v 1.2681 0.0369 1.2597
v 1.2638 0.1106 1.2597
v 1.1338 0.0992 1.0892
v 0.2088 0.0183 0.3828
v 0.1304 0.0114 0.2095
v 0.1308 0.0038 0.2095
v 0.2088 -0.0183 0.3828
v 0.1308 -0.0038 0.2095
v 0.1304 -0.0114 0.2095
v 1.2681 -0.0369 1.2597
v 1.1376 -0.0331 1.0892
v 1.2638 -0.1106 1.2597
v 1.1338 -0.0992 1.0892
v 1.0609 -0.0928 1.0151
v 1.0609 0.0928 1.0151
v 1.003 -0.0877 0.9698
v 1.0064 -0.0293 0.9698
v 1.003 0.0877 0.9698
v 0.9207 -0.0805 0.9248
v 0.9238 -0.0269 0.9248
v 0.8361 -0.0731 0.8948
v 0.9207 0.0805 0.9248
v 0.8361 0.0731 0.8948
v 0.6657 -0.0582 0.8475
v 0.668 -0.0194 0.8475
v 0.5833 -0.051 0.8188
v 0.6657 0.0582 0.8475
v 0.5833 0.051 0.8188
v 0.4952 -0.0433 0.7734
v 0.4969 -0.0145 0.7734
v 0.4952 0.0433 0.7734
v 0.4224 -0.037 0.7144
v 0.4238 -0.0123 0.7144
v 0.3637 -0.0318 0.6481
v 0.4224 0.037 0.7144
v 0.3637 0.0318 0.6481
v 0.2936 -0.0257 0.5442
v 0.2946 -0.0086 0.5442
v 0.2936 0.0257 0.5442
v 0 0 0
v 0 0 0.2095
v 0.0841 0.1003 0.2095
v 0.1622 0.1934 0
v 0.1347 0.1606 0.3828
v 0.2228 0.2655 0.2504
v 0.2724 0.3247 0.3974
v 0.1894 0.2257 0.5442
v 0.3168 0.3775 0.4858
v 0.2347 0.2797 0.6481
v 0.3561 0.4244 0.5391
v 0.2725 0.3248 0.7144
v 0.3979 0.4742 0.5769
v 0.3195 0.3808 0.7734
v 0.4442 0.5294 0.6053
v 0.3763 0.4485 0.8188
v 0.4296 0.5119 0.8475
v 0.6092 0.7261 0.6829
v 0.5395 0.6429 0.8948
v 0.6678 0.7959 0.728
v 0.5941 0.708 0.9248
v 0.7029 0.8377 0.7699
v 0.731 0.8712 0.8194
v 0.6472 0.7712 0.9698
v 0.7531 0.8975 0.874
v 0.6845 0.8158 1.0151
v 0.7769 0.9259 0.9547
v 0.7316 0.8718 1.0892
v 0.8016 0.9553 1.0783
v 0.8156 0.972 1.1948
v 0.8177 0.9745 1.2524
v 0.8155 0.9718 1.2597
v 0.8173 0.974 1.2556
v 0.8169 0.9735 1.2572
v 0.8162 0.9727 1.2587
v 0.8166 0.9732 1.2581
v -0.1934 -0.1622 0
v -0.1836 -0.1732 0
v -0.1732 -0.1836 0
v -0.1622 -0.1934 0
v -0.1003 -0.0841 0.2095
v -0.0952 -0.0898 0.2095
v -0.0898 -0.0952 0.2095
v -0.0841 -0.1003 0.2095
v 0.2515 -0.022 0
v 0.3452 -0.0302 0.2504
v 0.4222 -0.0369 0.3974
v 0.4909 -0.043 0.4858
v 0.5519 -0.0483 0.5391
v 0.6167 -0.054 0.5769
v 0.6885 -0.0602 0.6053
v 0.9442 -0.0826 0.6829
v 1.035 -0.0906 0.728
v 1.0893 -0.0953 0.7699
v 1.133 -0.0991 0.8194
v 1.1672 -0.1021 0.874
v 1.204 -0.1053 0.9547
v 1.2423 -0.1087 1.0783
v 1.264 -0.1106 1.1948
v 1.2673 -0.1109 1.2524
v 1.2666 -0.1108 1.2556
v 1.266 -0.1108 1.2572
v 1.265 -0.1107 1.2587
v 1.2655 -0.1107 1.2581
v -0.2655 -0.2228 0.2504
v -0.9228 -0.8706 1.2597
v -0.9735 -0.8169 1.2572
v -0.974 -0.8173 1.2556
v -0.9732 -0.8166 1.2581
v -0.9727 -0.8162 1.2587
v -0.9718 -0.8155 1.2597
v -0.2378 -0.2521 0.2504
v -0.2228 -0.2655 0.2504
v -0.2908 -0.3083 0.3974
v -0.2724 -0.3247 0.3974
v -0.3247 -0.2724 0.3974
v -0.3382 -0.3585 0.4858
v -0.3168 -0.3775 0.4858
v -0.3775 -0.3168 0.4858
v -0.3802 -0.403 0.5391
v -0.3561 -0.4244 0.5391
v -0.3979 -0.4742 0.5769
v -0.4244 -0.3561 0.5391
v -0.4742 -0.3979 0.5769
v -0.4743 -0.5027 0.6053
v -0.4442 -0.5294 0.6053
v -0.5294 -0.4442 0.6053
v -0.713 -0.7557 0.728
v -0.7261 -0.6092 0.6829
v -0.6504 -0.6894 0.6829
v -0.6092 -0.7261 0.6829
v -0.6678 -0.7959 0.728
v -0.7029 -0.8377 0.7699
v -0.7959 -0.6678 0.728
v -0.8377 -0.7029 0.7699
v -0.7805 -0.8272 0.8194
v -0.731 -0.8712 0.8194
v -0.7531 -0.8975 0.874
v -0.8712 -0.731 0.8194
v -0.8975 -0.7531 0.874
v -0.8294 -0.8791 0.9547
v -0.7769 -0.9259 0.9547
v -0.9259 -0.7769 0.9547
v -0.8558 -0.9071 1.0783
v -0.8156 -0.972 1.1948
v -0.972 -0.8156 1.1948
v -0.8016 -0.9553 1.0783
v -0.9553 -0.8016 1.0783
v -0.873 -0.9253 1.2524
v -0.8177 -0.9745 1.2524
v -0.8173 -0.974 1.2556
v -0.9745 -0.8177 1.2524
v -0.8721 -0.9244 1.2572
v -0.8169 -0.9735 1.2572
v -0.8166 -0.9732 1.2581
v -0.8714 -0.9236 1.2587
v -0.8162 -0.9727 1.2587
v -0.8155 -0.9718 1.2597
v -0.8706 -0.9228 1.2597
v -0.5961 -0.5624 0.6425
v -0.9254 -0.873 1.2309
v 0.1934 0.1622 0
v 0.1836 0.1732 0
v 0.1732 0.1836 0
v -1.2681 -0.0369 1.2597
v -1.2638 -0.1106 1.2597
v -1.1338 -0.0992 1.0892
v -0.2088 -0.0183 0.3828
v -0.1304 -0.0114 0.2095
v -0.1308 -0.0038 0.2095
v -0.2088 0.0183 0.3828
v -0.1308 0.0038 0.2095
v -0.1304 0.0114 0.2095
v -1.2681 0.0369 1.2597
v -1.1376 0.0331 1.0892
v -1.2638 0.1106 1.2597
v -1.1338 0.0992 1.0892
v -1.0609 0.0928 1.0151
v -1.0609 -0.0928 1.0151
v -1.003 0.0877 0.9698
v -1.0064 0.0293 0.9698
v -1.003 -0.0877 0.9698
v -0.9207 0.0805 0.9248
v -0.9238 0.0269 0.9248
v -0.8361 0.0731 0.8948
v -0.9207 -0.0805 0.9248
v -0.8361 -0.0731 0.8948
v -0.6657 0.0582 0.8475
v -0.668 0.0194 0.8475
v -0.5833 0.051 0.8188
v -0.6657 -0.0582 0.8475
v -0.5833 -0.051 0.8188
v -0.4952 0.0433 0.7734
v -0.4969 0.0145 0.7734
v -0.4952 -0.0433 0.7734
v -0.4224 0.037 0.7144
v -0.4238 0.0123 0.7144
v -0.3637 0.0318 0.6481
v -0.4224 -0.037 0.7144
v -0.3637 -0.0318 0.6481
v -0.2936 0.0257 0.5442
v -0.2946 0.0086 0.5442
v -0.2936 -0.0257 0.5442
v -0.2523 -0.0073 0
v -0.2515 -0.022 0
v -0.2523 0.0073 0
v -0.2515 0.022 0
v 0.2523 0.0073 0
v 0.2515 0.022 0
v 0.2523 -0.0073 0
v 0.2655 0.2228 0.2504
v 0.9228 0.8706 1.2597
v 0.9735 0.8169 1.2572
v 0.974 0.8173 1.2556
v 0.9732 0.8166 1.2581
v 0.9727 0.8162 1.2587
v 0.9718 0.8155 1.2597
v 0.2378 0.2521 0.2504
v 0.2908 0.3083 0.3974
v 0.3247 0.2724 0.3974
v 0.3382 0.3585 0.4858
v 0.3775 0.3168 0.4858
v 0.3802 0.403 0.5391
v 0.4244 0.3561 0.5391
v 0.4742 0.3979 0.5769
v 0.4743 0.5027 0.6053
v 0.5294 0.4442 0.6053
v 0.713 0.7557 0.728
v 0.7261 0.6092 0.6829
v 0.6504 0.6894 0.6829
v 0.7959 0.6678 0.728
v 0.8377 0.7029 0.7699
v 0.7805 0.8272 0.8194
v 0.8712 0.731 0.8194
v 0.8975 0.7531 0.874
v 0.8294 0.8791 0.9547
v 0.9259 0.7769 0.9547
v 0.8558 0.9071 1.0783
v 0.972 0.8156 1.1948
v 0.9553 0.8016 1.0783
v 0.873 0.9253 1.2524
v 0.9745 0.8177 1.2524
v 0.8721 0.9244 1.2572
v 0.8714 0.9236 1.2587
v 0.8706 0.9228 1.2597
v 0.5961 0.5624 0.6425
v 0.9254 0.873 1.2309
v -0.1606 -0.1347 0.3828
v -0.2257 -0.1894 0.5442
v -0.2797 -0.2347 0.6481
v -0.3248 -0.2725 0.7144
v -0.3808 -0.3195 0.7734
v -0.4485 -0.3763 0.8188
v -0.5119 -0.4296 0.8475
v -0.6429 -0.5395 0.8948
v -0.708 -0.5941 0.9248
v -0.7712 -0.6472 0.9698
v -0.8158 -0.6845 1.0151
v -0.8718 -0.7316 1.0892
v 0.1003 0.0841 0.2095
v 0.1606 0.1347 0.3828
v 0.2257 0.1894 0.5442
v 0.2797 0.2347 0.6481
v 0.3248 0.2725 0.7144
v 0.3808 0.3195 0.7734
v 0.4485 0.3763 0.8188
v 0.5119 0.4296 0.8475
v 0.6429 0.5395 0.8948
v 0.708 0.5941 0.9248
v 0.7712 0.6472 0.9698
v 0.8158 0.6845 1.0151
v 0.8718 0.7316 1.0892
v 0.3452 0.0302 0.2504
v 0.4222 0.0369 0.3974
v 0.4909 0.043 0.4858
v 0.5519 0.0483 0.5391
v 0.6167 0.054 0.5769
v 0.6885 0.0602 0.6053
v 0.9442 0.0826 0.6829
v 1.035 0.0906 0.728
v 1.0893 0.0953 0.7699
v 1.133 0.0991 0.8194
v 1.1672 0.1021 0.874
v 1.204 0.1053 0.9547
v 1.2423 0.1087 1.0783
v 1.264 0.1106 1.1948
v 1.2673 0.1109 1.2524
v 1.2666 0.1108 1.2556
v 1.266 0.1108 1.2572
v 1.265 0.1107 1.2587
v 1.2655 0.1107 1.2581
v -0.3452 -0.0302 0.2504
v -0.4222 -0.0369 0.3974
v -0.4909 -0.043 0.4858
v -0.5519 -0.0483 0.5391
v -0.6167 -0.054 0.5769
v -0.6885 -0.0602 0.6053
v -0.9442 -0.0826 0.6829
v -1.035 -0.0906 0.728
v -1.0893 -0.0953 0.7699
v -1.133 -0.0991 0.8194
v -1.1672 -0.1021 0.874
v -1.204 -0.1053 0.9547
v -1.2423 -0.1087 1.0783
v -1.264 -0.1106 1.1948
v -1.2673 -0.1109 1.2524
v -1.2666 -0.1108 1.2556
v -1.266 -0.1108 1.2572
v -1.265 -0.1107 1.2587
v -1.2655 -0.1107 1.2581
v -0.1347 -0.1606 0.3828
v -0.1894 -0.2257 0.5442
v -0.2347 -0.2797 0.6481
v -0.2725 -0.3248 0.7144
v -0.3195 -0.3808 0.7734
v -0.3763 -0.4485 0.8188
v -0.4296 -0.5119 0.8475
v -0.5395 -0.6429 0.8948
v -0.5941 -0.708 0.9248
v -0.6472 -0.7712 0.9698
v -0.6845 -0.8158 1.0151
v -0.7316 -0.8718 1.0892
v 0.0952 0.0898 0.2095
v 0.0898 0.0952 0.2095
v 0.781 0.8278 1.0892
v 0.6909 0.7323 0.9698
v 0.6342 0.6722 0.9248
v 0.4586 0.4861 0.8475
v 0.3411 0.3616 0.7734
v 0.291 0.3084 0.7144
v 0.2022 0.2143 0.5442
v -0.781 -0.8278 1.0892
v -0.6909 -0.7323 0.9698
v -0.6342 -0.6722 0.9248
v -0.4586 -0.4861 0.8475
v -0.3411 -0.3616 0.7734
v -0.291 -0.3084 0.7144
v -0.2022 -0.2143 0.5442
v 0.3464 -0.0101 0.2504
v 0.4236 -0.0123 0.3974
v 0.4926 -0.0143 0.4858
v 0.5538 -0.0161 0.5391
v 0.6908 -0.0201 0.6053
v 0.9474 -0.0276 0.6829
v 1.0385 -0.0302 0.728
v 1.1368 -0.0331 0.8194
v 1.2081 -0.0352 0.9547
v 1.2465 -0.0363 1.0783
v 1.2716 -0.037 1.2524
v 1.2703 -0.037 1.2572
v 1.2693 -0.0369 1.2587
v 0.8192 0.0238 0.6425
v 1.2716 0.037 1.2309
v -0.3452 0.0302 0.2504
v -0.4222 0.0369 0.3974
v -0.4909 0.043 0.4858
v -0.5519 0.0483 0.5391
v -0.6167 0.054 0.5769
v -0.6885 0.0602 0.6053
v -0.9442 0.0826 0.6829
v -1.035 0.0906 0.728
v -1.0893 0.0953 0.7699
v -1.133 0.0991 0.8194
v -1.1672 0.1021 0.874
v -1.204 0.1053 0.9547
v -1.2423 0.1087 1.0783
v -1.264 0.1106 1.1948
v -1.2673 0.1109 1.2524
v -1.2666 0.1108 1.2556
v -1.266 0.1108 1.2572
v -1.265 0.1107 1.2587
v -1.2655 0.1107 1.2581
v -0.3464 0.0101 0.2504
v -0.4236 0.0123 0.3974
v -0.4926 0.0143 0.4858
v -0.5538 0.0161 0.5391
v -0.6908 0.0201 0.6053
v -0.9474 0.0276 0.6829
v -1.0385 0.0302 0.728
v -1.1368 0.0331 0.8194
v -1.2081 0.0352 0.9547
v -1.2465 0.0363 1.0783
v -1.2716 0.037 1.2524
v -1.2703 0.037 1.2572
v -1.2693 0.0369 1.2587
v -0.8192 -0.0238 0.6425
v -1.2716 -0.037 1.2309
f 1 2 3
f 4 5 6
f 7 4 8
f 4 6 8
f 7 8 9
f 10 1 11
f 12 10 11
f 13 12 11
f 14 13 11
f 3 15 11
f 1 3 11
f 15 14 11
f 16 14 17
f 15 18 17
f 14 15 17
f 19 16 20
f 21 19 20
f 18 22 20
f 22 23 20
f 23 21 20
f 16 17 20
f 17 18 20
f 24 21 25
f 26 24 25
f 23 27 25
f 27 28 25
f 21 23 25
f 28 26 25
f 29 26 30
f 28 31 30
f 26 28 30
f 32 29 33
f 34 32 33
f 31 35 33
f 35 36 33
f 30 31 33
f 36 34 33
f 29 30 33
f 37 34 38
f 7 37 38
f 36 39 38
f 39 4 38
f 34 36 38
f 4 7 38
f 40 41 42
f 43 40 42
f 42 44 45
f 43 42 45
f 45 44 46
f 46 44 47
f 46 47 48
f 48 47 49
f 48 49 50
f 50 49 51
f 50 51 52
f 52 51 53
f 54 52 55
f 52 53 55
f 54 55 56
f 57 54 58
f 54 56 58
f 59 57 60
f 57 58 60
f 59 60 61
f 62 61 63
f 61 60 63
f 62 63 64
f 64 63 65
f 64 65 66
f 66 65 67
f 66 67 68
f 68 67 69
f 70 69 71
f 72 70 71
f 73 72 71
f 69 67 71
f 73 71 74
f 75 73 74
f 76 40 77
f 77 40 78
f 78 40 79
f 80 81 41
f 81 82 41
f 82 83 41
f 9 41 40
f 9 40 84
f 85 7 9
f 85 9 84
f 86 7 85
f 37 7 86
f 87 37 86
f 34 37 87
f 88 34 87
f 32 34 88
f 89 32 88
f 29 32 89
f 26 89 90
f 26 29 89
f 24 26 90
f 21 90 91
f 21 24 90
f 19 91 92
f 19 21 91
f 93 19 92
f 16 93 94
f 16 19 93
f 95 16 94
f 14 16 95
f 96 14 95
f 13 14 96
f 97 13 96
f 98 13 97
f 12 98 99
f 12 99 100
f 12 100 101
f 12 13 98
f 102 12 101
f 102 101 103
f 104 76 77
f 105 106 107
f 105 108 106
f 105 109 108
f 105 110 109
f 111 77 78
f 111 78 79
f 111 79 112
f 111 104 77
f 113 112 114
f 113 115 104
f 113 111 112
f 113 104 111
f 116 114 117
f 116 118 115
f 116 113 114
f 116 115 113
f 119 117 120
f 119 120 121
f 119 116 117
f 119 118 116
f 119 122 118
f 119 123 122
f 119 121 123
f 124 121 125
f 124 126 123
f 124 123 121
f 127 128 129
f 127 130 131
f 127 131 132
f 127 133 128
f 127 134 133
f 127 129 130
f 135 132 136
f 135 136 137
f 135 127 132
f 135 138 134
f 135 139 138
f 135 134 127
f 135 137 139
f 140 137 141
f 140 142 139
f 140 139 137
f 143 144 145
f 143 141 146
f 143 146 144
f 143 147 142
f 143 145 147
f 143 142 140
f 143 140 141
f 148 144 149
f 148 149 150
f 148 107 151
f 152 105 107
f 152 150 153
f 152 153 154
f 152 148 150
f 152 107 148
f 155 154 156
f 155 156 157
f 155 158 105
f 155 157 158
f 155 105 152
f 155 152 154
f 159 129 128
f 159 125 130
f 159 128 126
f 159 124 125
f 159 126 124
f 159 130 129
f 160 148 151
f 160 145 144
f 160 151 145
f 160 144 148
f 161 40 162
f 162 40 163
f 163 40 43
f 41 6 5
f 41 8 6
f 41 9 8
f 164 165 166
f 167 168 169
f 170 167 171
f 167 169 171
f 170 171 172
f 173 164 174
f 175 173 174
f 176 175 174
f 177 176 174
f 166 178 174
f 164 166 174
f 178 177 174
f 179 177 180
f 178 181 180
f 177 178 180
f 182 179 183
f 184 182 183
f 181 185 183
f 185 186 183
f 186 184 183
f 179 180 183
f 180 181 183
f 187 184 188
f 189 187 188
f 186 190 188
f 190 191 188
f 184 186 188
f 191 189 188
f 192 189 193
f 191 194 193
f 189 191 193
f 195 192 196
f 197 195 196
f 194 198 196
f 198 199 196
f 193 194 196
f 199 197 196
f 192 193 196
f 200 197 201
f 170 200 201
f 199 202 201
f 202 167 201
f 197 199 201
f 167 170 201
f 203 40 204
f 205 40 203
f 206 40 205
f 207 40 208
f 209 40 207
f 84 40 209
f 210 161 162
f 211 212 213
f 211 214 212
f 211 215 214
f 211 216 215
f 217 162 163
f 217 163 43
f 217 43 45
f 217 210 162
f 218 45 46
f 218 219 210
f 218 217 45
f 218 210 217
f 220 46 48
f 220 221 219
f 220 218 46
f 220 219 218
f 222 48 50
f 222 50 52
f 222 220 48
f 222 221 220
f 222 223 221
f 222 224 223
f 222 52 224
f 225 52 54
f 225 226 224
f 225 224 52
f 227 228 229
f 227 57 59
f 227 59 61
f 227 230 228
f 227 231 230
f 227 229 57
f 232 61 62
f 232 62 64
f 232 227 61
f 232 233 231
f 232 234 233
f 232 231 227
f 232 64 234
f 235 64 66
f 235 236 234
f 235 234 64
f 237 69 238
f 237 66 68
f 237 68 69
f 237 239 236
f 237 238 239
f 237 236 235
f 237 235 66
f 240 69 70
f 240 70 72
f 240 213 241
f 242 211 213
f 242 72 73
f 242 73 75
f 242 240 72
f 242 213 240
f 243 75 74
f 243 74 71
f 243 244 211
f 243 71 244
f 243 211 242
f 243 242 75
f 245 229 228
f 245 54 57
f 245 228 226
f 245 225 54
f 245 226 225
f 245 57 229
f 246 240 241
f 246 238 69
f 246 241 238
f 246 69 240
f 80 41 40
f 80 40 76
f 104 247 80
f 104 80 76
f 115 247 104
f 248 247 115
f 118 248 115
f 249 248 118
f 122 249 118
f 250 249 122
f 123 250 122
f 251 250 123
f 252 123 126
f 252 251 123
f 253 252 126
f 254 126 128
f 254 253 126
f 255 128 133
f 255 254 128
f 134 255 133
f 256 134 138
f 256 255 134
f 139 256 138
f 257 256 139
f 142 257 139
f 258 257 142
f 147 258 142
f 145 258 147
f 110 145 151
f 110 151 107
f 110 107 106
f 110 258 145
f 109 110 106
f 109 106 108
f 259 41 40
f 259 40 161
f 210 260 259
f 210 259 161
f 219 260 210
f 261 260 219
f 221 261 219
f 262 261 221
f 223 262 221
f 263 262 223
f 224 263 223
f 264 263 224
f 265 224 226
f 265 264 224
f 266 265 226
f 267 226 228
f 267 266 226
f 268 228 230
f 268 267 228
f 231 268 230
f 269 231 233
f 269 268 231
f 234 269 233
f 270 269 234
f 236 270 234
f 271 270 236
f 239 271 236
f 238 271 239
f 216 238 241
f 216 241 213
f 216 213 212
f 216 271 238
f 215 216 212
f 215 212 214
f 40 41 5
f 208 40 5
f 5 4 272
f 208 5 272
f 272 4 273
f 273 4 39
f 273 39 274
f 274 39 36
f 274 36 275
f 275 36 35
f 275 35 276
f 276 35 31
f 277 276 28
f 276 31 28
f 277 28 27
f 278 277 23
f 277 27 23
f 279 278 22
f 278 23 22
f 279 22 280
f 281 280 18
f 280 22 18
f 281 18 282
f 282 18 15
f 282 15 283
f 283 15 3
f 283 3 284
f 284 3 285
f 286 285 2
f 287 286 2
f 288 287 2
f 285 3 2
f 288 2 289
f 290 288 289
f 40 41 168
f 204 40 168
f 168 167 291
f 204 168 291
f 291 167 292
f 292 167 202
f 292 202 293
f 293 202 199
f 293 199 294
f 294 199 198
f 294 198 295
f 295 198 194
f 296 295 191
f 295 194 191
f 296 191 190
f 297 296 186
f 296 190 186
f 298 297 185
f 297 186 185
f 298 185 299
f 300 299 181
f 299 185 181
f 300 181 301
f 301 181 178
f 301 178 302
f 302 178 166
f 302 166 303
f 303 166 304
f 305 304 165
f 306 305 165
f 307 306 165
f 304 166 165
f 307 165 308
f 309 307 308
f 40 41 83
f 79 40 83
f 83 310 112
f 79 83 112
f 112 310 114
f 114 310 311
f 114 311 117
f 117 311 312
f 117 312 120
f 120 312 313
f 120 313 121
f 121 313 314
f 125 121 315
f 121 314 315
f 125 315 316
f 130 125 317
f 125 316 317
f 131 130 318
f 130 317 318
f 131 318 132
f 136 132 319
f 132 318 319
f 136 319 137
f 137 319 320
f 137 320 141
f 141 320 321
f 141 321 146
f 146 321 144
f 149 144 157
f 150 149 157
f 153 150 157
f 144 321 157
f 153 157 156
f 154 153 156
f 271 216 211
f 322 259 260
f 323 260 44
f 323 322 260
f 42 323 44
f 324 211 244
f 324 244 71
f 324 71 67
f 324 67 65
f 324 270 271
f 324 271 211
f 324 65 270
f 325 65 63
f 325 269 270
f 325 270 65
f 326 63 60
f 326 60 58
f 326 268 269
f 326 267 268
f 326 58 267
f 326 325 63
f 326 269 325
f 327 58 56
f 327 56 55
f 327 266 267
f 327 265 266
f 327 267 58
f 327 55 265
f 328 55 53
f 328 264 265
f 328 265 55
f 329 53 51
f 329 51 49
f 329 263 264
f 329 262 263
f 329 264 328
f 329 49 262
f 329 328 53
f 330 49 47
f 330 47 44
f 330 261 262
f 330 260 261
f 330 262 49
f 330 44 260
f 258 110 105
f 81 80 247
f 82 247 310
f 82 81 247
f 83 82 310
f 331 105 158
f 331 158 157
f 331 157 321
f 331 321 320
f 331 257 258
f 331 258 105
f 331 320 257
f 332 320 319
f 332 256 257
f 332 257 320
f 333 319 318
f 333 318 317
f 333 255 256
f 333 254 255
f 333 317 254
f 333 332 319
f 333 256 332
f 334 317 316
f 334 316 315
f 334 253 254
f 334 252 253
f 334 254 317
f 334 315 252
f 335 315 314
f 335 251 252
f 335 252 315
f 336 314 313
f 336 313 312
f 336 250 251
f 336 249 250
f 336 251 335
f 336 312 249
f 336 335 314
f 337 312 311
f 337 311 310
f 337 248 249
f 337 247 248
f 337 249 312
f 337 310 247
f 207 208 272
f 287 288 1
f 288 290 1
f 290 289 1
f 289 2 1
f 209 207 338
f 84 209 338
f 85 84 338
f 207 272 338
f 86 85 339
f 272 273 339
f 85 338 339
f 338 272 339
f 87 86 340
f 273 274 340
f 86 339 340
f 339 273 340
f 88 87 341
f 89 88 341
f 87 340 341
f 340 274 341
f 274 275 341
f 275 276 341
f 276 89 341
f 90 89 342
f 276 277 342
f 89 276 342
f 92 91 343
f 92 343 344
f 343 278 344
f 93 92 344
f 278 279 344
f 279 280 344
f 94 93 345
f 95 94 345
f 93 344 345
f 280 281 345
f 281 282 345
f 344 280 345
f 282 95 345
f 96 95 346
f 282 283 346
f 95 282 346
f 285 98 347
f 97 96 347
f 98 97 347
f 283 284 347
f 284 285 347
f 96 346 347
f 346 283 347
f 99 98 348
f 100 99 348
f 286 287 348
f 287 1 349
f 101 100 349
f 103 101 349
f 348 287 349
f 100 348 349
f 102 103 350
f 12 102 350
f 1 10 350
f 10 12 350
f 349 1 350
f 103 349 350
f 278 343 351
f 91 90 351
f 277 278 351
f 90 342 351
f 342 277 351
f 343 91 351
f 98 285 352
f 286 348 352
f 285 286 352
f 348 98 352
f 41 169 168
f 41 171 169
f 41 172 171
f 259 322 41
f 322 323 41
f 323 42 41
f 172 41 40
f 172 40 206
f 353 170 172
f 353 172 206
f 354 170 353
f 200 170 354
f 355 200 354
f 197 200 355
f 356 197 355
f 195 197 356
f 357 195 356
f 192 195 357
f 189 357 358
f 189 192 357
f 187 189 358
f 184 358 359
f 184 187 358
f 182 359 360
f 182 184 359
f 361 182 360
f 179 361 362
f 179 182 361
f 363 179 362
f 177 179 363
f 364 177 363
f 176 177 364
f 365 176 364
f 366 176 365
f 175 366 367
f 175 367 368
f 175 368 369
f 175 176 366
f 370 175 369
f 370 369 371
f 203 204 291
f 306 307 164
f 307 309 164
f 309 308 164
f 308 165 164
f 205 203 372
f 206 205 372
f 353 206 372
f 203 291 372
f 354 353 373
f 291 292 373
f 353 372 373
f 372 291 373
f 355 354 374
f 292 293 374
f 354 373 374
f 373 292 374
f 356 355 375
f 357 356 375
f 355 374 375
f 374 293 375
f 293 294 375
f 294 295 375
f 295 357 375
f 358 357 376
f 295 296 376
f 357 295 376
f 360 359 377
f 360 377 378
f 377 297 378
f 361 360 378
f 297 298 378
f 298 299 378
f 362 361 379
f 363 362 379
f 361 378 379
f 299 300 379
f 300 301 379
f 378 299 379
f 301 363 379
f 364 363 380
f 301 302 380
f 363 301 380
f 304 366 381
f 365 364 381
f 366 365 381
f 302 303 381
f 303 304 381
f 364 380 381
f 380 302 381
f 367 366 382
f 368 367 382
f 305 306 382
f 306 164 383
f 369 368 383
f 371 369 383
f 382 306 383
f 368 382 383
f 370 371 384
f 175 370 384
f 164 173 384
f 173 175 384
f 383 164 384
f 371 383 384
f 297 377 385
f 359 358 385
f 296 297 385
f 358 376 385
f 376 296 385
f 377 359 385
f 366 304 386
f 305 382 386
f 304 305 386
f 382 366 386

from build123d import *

# Parameters (mm, degrees)
F1_ANGLE_BACK = 5
F1_ANGLE      = 10
F3_COUNT      = 2


# Not quite as in the source:
# - a feature of the source that left no trace in its solid (it failed there, or was rolled back) is left out
# - a pattern or mirror of a feature is missing from the dataset's text; its kind, count and spacing are read off the source's solid


with BuildPart() as f1:
    # F0 (on Front) → F1 (revolve)
    with BuildSketch(Plane.XZ, mode=Mode.PRIVATE) as f1_sk:
        with BuildLine():
            add(Edge.make_bspline(
                [(-0.2524105464, 0), (-0.3307396385, 0.2256188139), (-0.4842284802, 0.6677274801), (-1.1998001381, 0.6252029855), (-1.2821282206, 1.2497196877), (-1.27, 1.2586820995), (-1.2686543401, 1.2596765041)],
                knots=[0, 0, 0, 0, 0.3404855991, 0.6671945103, 0.9630743035, 1, 1, 1, 1], degree=3))
            Line((-0.2524105464, 0), (0, 0))
            Line((0, 0), (0, 0.2095003059))
            Line((0, 0.2095003059), (-0.1308880734, 0.2095003059))
            add(Edge.make_bspline(
                [(-1.2686543401, 1.2596765041), (-1.1780005744, 1.133165691), (-0.9921915467, 0.8735596961), (-0.4159894857, 0.8570240231), (-0.230923084, 0.434631534), (-0.1308880734, 0.2095003059)],
                knots=[0, 0, 0, 0, 0.3061295799, 0.6268084555, 1, 1, 1, 1], degree=3))
        make_face()
    revolve(f1_sk.sketch.rotate(Axis((0, 0, 0.104750153), (0, 0, -1)), -F1_ANGLE_BACK), axis=Axis((0, 0, 0.104750153), (0, 0, -1)), revolution_arc=F1_ANGLE)

    # F1_copies: F1 across plane


with BuildPart() as f1_1:
    add(f1.part)
    add(f1.part.mirror(Plane(origin=(0, 0, 0), x_dir=(-0.3826834324, 0.9238795325, 0), z_dir=(0.9238795325, 0.3826834324, 0))))


with BuildPart() as f3_1:
    # F3: instance of F1
    add(f1_1.part.rotate(Axis((0, 0, 0.104750153), (0, 0, 1)), 1 * 360 / F3_COUNT))


solid = Compound([f1_1.part, f3_1.part])
